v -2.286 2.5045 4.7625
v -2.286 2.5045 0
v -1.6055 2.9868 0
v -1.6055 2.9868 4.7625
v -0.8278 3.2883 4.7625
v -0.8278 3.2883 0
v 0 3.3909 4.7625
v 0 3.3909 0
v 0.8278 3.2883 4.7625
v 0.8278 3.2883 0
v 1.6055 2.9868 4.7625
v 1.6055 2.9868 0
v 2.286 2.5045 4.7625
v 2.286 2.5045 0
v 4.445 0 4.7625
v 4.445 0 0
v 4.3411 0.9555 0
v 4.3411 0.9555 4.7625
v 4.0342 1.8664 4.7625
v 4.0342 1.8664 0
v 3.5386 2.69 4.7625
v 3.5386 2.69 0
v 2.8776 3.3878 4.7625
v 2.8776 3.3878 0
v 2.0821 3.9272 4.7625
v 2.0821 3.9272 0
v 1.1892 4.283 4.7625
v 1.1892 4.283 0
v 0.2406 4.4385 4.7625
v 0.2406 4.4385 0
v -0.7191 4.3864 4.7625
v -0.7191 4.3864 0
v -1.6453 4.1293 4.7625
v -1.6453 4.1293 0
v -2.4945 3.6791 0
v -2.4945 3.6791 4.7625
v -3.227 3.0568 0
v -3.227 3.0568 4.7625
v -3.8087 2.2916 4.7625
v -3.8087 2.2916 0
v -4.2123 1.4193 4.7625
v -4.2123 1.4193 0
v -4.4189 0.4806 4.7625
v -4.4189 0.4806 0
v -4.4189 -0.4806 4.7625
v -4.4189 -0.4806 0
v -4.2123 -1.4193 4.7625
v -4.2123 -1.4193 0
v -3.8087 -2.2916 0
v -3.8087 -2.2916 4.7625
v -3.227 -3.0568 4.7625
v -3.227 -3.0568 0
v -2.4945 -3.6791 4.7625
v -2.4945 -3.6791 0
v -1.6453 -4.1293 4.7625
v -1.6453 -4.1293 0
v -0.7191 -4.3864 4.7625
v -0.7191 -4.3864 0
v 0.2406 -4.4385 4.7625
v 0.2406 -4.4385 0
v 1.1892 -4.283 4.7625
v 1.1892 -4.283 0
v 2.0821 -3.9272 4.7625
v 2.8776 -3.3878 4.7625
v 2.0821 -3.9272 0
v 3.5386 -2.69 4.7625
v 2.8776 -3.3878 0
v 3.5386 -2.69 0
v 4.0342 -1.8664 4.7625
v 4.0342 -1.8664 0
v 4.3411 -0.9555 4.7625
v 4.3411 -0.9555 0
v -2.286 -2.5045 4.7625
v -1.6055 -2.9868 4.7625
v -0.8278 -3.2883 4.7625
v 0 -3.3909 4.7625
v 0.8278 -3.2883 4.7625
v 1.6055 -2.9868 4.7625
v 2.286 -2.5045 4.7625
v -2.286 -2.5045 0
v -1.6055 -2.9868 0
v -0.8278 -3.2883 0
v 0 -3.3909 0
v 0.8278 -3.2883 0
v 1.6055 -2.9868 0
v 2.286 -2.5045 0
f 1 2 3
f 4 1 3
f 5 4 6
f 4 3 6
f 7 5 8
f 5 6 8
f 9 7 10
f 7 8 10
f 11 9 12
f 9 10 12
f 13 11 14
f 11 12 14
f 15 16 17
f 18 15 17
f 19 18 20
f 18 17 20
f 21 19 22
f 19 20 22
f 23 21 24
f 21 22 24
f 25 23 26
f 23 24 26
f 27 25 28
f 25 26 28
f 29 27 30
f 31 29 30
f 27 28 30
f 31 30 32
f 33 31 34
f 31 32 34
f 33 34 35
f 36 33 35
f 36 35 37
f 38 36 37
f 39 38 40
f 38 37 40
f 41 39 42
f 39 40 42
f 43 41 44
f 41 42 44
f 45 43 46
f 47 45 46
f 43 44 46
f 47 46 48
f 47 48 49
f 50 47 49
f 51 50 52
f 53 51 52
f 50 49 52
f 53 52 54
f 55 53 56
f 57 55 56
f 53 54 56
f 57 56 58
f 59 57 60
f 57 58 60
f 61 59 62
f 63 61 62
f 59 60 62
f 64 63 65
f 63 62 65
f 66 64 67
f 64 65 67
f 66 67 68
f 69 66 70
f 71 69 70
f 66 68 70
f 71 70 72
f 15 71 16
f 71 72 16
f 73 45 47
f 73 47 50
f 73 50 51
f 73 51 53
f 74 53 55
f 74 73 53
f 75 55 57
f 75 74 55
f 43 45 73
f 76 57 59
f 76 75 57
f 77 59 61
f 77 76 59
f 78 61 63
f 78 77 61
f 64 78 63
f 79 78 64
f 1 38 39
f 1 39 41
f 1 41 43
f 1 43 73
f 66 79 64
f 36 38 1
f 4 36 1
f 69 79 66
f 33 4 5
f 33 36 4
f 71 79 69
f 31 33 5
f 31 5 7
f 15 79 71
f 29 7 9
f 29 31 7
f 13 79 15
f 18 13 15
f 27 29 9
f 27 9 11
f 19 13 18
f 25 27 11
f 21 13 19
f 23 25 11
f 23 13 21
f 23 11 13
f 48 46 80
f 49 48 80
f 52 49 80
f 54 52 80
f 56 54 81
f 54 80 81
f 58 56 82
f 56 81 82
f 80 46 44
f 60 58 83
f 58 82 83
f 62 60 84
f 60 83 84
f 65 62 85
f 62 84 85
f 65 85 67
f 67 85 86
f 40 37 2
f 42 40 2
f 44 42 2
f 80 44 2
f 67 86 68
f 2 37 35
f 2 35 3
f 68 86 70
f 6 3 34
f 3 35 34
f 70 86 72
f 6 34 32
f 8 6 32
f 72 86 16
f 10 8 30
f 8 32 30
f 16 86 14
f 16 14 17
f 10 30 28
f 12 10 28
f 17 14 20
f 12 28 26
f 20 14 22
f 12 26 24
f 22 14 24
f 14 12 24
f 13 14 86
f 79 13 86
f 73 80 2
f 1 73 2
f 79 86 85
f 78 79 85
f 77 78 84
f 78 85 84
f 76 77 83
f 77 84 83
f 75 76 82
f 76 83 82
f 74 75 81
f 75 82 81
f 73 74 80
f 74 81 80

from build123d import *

# Parameters (mm, degrees)
F0_R     = 4.445
F1_DEPTH = 4.7625


# Not quite as in the source:
# - a length typed as a fraction of an inch, garbled in the dataset ("3 / 203.2 mm" for 3/8 in), is restored


with BuildPart() as f1:
    # F0 (on Top) → F1 (new body)
    with BuildSketch(Plane.XY):
        Circle(F0_R)
        with BuildLine():
            ThreePointArc((2.286, 2.5044773527), (3.1024023119, 1.3686864889), (3.3909, 0))
            ThreePointArc((3.3909, 0), (3.1024023119, -1.3686864889), (2.286, -2.5044773527))
            ThreePointArc((2.286, -2.5044773527), (0, -3.3909), (-2.286, -2.5044773527))
            ThreePointArc((-2.286, -2.5044773527), (-3.3909, 0), (-2.286, 2.5044773527))
            ThreePointArc((-2.286, 2.5044773527), (0, 3.3909), (2.286, 2.5044773527))
        make_face(mode=Mode.SUBTRACT)
        with BuildLine():
            Line((-2.286, -2.5044773527), (-2.286, 2.5044773527))
            ThreePointArc((-2.286, 2.5044773527), (-3.3909, 0), (-2.286, -2.5044773527))
        make_face()
        with BuildLine():
            ThreePointArc((2.286, -2.5044773527), (3.1024023119, -1.3686864889), (3.3909, 0))
            ThreePointArc((3.3909, 0), (3.1024023119, 1.3686864889), (2.286, 2.5044773527))
            Line((2.286, 2.5044773527), (2.286, -2.5044773527))
        make_face()
    extrude(amount=F1_DEPTH)


solid = f1.part
